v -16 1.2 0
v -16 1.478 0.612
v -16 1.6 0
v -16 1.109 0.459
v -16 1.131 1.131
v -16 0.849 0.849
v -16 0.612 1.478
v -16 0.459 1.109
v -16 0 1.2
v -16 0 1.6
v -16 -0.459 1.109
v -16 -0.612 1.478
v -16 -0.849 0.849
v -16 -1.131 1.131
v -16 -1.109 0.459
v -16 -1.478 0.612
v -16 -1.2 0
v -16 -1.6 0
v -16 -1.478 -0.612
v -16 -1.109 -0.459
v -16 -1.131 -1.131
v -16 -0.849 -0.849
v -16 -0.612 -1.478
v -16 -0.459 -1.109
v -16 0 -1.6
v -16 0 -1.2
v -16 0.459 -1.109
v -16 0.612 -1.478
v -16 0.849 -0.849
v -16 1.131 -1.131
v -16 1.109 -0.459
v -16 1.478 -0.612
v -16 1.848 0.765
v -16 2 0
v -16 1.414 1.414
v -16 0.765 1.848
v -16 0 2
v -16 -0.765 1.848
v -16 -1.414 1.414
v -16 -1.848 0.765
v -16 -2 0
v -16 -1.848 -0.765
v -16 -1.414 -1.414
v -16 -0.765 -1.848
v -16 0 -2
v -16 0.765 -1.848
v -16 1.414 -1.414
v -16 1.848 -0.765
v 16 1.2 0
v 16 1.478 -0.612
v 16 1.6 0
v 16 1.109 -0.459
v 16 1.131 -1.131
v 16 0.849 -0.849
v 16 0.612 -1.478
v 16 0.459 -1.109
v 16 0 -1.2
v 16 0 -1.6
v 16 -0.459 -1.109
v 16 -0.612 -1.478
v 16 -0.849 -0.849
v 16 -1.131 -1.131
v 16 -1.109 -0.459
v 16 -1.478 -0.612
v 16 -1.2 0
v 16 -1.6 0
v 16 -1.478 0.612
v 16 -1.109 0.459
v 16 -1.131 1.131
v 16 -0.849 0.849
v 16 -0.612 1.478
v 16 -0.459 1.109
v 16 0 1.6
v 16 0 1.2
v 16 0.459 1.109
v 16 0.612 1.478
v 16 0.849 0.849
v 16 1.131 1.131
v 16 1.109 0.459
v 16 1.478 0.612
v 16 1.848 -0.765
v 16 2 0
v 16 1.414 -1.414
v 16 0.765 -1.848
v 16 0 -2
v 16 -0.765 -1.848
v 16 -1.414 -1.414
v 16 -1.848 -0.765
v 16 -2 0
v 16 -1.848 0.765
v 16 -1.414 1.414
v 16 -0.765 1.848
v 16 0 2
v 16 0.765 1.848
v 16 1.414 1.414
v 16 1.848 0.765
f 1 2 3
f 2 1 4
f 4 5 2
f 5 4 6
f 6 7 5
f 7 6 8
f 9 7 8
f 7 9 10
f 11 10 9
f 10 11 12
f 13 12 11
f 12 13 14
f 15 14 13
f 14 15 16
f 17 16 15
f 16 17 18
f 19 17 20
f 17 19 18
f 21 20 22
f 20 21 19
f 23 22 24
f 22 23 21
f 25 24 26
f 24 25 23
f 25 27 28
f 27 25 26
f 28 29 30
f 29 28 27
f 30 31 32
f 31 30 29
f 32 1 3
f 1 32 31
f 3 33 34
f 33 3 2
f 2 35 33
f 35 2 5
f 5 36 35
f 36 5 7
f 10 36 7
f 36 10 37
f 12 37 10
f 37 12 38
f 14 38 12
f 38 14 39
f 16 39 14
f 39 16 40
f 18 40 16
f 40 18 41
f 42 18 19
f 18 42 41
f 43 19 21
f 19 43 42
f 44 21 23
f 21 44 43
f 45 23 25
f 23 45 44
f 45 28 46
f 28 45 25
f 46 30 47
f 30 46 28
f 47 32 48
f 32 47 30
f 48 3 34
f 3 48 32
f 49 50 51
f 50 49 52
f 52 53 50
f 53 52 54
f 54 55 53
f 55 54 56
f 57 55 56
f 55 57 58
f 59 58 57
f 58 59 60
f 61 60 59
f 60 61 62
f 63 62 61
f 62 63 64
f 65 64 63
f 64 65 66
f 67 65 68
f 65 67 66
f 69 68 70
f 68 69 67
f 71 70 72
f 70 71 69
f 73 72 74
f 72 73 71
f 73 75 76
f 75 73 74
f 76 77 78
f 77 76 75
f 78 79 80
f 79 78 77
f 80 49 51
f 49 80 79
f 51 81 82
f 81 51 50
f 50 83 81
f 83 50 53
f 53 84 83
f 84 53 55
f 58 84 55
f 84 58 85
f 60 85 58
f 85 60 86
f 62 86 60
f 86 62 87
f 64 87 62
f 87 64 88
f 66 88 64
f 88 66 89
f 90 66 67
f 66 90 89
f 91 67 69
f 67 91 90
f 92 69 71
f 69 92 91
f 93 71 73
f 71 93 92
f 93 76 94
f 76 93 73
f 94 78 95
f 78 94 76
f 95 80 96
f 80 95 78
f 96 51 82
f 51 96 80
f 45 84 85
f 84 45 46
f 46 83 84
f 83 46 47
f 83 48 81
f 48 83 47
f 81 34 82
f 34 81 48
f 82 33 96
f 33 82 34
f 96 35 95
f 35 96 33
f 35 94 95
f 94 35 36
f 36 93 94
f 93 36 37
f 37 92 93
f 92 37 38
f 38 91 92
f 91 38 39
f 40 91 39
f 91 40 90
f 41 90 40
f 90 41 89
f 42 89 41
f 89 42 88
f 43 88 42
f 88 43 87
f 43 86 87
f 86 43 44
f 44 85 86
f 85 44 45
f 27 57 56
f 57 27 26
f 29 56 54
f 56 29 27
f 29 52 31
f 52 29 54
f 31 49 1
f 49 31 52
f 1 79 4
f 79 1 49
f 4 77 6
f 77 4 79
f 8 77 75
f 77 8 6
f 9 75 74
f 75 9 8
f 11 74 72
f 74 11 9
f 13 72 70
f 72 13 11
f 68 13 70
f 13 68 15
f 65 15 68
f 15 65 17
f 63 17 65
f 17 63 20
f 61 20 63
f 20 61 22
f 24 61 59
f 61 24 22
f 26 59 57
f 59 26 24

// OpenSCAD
// file: ../p/4-4cyli.scad
use <../lib.scad>
function ldraw_lib__4_4cyli() = [
// 0 Cylinder 1.0
// 0 Name: 4-4cyli.dat
// 0 Author: James Jessiman
// 0 !LDRAW_ORG Primitive UPDATE 2005-01
// 0 !LICENSE Licensed under CC BY 4.0 : see CAreadme.txt
// 
// 0 BFC CERTIFY CCW
  [0,"BFC","CERTIFY"],
  [0,"BFC","CCW"],
// 
// 0 !HISTORY 1998-12-15 [PTadmin] Official Update 1998-10
// 0 !HISTORY 2002-03-23 [sbliss] Added BFC statement; merged headers from files in distributions LDraw 0.27 and Complete.
// 0 !HISTORY 2002-04-25 [PTadmin] Official Update 2002-02
// 0 !HISTORY 2004-12-14 [guyvivan] BFC CCW
// 0 !HISTORY 2005-12-28 [PTadmin] Official Update 2005-01
// 0 !HISTORY 2007-06-24 [PTadmin] Header formatted for Contributor Agreement
// 0 !HISTORY 2008-07-01 [PTadmin] Official Update 2008-01
// 
// 
// 4 16 1 1 0 0.9239 1 0.3827 0.9239 0 0.3827 1 0 0
  [4,16,1,1,0,0.9239,1,0.3827,0.9239,0,0.3827,1,0,0],
// 5 24 1 0 0 1 1 0 0.9239 0 0.3827 0.9239 0 -0.3827
  [5,24,1,0,0,1,1,0,0.9239,0,0.3827,0.9239,0,-0.3827],
// 4 16 0.9239 1 0.3827 0.7071 1 0.7071 0.7071 0 0.7071 0.9239 0 0.3827
  [4,16,0.9239,1,0.3827,0.7071,1,0.7071,0.7071,0,0.7071,0.9239,0,0.3827],
// 5 24 0.9239 0 0.3827 0.9239 1 0.3827 0.7071 0 0.7071 1 0 0
  [5,24,0.9239,0,0.3827,0.9239,1,0.3827,0.7071,0,0.7071,1,0,0],
// 4 16 0.7071 1 0.7071 0.3827 1 0.9239 0.3827 0 0.9239 0.7071 0 0.7071
  [4,16,0.7071,1,0.7071,0.3827,1,0.9239,0.3827,0,0.9239,0.7071,0,0.7071],
// 5 24 0.7071 0 0.7071 0.7071 1 0.7071 0.3827 0 0.9239 0.9239 0 0.3827
  [5,24,0.7071,0,0.7071,0.7071,1,0.7071,0.3827,0,0.9239,0.9239,0,0.3827],
// 4 16 0.3827 1 0.9239 0 1 1 0 0 1 0.3827 0 0.9239
  [4,16,0.3827,1,0.9239,0,1,1,0,0,1,0.3827,0,0.9239],
// 5 24 0.3827 0 0.9239 0.3827 1 0.9239 0 0 1 0.7071 0 0.7071
  [5,24,0.3827,0,0.9239,0.3827,1,0.9239,0,0,1,0.7071,0,0.7071],
// 4 16 0 1 1 -0.3827 1 0.9239 -0.3827 0 0.9239 0 0 1
  [4,16,0,1,1,-0.3827,1,0.9239,-0.3827,0,0.9239,0,0,1],
// 5 24 0 0 1 0 1 1 -0.3827 0 0.9239 0.3827 0 0.9239
  [5,24,0,0,1,0,1,1,-0.3827,0,0.9239,0.3827,0,0.9239],
// 4 16 -0.3827 1 0.9239 -0.7071 1 0.7071 -0.7071 0 0.7071 -0.3827 0 0.9239
  [4,16,-0.3827,1,0.9239,-0.7071,1,0.7071,-0.7071,0,0.7071,-0.3827,0,0.9239],
// 5 24 -0.3827 0 0.9239 -0.3827 1 0.9239 -0.7071 0 0.7071 0 0 1
  [5,24,-0.3827,0,0.9239,-0.3827,1,0.9239,-0.7071,0,0.7071,0,0,1],
// 4 16 -0.7071 1 0.7071 -0.9239 1 0.3827 -0.9239 0 0.3827 -0.7071 0 0.7071
  [4,16,-0.7071,1,0.7071,-0.9239,1,0.3827,-0.9239,0,0.3827,-0.7071,0,0.7071],
// 5 24 -0.7071 0 0.7071 -0.7071 1 0.7071 -0.9239 0 0.3827 -0.3827 0 0.9239
  [5,24,-0.7071,0,0.7071,-0.7071,1,0.7071,-0.9239,0,0.3827,-0.3827,0,0.9239],
// 4 16 -0.9239 1 0.3827 -1 1 0 -1 0 0 -0.9239 0 0.3827
  [4,16,-0.9239,1,0.3827,-1,1,0,-1,0,0,-0.9239,0,0.3827],
// 5 24 -0.9239 0 0.3827 -0.9239 1 0.3827 -1 0 0 -0.7071 0 0.7071
  [5,24,-0.9239,0,0.3827,-0.9239,1,0.3827,-1,0,0,-0.7071,0,0.7071],
// 4 16 -1 1 0 -0.9239 1 -0.3827 -0.9239 0 -0.3827 -1 0 0
  [4,16,-1,1,0,-0.9239,1,-0.3827,-0.9239,0,-0.3827,-1,0,0],
// 5 24 -1 0 0 -1 1 0 -0.9239 0 -0.3827 -0.9239 0 0.3827
  [5,24,-1,0,0,-1,1,0,-0.9239,0,-0.3827,-0.9239,0,0.3827],
// 4 16 -0.9239 1 -0.3827 -0.7071 1 -0.7071 -0.7071 0 -0.7071 -0.9239 0 -0.3827
  [4,16,-0.9239,1,-0.3827,-0.7071,1,-0.7071,-0.7071,0,-0.7071,-0.9239,0,-0.3827],
// 5 24 -0.9239 0 -0.3827 -0.9239 1 -0.3827 -0.7071 0 -0.7071 -1 0 0
  [5,24,-0.9239,0,-0.3827,-0.9239,1,-0.3827,-0.7071,0,-0.7071,-1,0,0],
// 4 16 -0.7071 1 -0.7071 -0.3827 1 -0.9239 -0.3827 0 -0.9239 -0.7071 0 -0.7071
  [4,16,-0.7071,1,-0.7071,-0.3827,1,-0.9239,-0.3827,0,-0.9239,-0.7071,0,-0.7071],
// 5 24 -0.7071 0 -0.7071 -0.7071 1 -0.7071 -0.3827 0 -0.9239 -0.9239 0 -0.3827
  [5,24,-0.7071,0,-0.7071,-0.7071,1,-0.7071,-0.3827,0,-0.9239,-0.9239,0,-0.3827],
// 4 16 -0.3827 1 -0.9239 0 1 -1 0 0 -1 -0.3827 0 -0.9239
  [4,16,-0.3827,1,-0.9239,0,1,-1,0,0,-1,-0.3827,0,-0.9239],
// 5 24 -0.3827 0 -0.9239 -0.3827 1 -0.9239 0 0 -1 -0.7071 0 -0.7071
  [5,24,-0.3827,0,-0.9239,-0.3827,1,-0.9239,0,0,-1,-0.7071,0,-0.7071],
// 4 16 0 1 -1 0.3827 1 -0.9239 0.3827 0 -0.9239 0 0 -1
  [4,16,0,1,-1,0.3827,1,-0.9239,0.3827,0,-0.9239,0,0,-1],
// 5 24 0 0 -1 0 1 -1 0.3827 0 -0.9239 -0.3827 0 -0.9239
  [5,24,0,0,-1,0,1,-1,0.3827,0,-0.9239,-0.3827,0,-0.9239],
// 4 16 0.3827 1 -0.9239 0.7071 1 -0.7071 0.7071 0 -0.7071 0.3827 0 -0.9239
  [4,16,0.3827,1,-0.9239,0.7071,1,-0.7071,0.7071,0,-0.7071,0.3827,0,-0.9239],
// 5 24 0.3827 0 -0.9239 0.3827 1 -0.9239 0.7071 0 -0.7071 0 0 -1
  [5,24,0.3827,0,-0.9239,0.3827,1,-0.9239,0.7071,0,-0.7071,0,0,-1],
// 4 16 0.7071 1 -0.7071 0.9239 1 -0.3827 0.9239 0 -0.3827 0.7071 0 -0.7071
  [4,16,0.7071,1,-0.7071,0.9239,1,-0.3827,0.9239,0,-0.3827,0.7071,0,-0.7071],
// 5 24 0.7071 0 -0.7071 0.7071 1 -0.7071 0.9239 0 -0.3827 0.3827 0 -0.9239
  [5,24,0.7071,0,-0.7071,0.7071,1,-0.7071,0.9239,0,-0.3827,0.3827,0,-0.9239],
// 4 16 0.9239 1 -0.3827 1 1 0 1 0 0 0.9239 0 -0.3827
  [4,16,0.9239,1,-0.3827,1,1,0,1,0,0,0.9239,0,-0.3827],
// 5 24 0.9239 0 -0.3827 0.9239 1 -0.3827 1 0 0 0.7071 0 -0.7071
  [5,24,0.9239,0,-0.3827,0.9239,1,-0.3827,1,0,0,0.7071,0,-0.7071],
// 0
];
module ldraw_lib__4_4cyli(step=0, col=false, unit=2/5, alt=false, line=0.2, solid=!$preview)
    makepoly(ldraw_lib__4_4cyli(), step=step, col=col, unit=unit, alt=alt, line=line, solid=solid);
ldraw_lib__4_4cyli(line=0.2);
// file: ../p/4-4ring4.scad
use <../lib.scad>
function ldraw_lib__4_4ring4() = [
// 0 Ring  4 x 1.0
// 0 Name: 4-4ring4.dat
// 0 Author: James Jessiman
// 0 !LDRAW_ORG Primitive UPDATE 2009-01
// 0 !LICENSE Licensed under CC BY 4.0 : see CAreadme.txt
// 
// 0 BFC CERTIFY CCW
  [0,"BFC","CERTIFY"],
  [0,"BFC","CCW"],
// 
// 0 !HISTORY 1998-12-15 [PTadmin] Official Update 1998-10
// 0 !HISTORY 2002-04-08 [BrickCaster] Modified for BFC compliance
// 0 !HISTORY 2002-04-25 [PTadmin] Official Update 2002-02
// 0 !HISTORY 2007-06-24 [PTadmin] Header formatted for Contributor Agreement
// 0 !HISTORY 2008-07-01 [PTadmin] Official Update 2008-01
// 0 !HISTORY 2008-08-26 [cwdee] Switch polygon winding and rename
// 0 !HISTORY 2009-05-02 [PTadmin] Official Update 2009-01
// 
// 
// 4 16 -1.9135 0 4.6195 -1.5308 0 3.6956 0 0 4 0 0 5
  [4,16,-1.9135,0,4.6195,-1.5308,0,3.6956,0,0,4,0,0,5],
// 4 16 -3.5355 0 3.5355 -2.8284 0 2.8284 -1.5308 0 3.6956 -1.9135 0 4.6195
  [4,16,-3.5355,0,3.5355,-2.8284,0,2.8284,-1.5308,0,3.6956,-1.9135,0,4.6195],
// 4 16 -4.6195 0 1.9135 -3.6956 0 1.5308 -2.8284 0 2.8284 -3.5355 0 3.5355
  [4,16,-4.6195,0,1.9135,-3.6956,0,1.5308,-2.8284,0,2.8284,-3.5355,0,3.5355],
// 4 16 -5 0 0 -4 0 0 -3.6956 0 1.5308 -4.6195 0 1.9135
  [4,16,-5,0,0,-4,0,0,-3.6956,0,1.5308,-4.6195,0,1.9135],
// 4 16 -4.6195 0 -1.9135 -3.6956 0 -1.5308 -4 0 0 -5 0 0
  [4,16,-4.6195,0,-1.9135,-3.6956,0,-1.5308,-4,0,0,-5,0,0],
// 4 16 -3.5355 0 -3.5355 -2.8284 0 -2.8284 -3.6956 0 -1.5308 -4.6195 0 -1.9135
  [4,16,-3.5355,0,-3.5355,-2.8284,0,-2.8284,-3.6956,0,-1.5308,-4.6195,0,-1.9135],
// 4 16 -1.9135 0 -4.6195 -1.5308 0 -3.6956 -2.8284 0 -2.8284 -3.5355 0 -3.5355
  [4,16,-1.9135,0,-4.6195,-1.5308,0,-3.6956,-2.8284,0,-2.8284,-3.5355,0,-3.5355],
// 4 16 0 0 -5 0 0 -4 -1.5308 0 -3.6956 -1.9135 0 -4.6195
  [4,16,0,0,-5,0,0,-4,-1.5308,0,-3.6956,-1.9135,0,-4.6195],
// 4 16 1.9135 0 -4.6195 1.5308 0 -3.6956 0 0 -4 0 0 -5
  [4,16,1.9135,0,-4.6195,1.5308,0,-3.6956,0,0,-4,0,0,-5],
// 4 16 3.5355 0 -3.5355 2.8284 0 -2.8284 1.5308 0 -3.6956 1.9135 0 -4.6195
  [4,16,3.5355,0,-3.5355,2.8284,0,-2.8284,1.5308,0,-3.6956,1.9135,0,-4.6195],
// 4 16 4.6195 0 -1.9135 3.6956 0 -1.5308 2.8284 0 -2.8284 3.5355 0 -3.5355
  [4,16,4.6195,0,-1.9135,3.6956,0,-1.5308,2.8284,0,-2.8284,3.5355,0,-3.5355],
// 4 16 5 0 0 4 0 0 3.6956 0 -1.5308 4.6195 0 -1.9135
  [4,16,5,0,0,4,0,0,3.6956,0,-1.5308,4.6195,0,-1.9135],
// 4 16 4.6195 0 1.9135 3.6956 0 1.5308 4 0 0 5 0 0
  [4,16,4.6195,0,1.9135,3.6956,0,1.5308,4,0,0,5,0,0],
// 4 16 3.5355 0 3.5355 2.8284 0 2.8284 3.6956 0 1.5308 4.6195 0 1.9135
  [4,16,3.5355,0,3.5355,2.8284,0,2.8284,3.6956,0,1.5308,4.6195,0,1.9135],
// 4 16 1.9135 0 4.6195 1.5308 0 3.6956 2.8284 0 2.8284 3.5355 0 3.5355
  [4,16,1.9135,0,4.6195,1.5308,0,3.6956,2.8284,0,2.8284,3.5355,0,3.5355],
// 4 16 0 0 5 0 0 4 1.5308 0 3.6956 1.9135 0 4.6195
  [4,16,0,0,5,0,0,4,1.5308,0,3.6956,1.9135,0,4.6195],
// 0
];
module ldraw_lib__4_4ring4(step=0, col=false, unit=2/5, alt=false, line=0.2, solid=!$preview)
    makepoly(ldraw_lib__4_4ring4(), step=step, col=col, unit=unit, alt=alt, line=line, solid=solid);
ldraw_lib__4_4ring4(line=0.2);
// file: ../p/4-4ring3.scad
use <../lib.scad>
function ldraw_lib__4_4ring3() = [
// 0 Ring  3 x 1.0
// 0 Name: 4-4ring3.dat
// 0 Author: James Jessiman
// 0 !LDRAW_ORG Primitive UPDATE 2009-01
// 0 !LICENSE Licensed under CC BY 4.0 : see CAreadme.txt
// 
// 0 BFC CERTIFY CCW
  [0,"BFC","CERTIFY"],
  [0,"BFC","CCW"],
// 
// 0 !HISTORY 1998-12-15 [PTadmin] Official Update 1998-10
// 0 !HISTORY 2002-04-05 [hafhead] Added BFC statement
// 0 !HISTORY 2002-04-25 [PTadmin] Official Update 2002-02
// 0 !HISTORY 2007-06-24 [PTadmin] Header formatted for Contributor Agreement
// 0 !HISTORY 2008-07-01 [PTadmin] Official Update 2008-01
// 0 !HISTORY 2008-08-26 [cwdee] Switch polygon winding and rename
// 0 !HISTORY 2009-05-02 [PTadmin] Official Update 2009-01
// 
// 
// 4 16 -1.5308 0 3.6956 -1.1481 0 2.7717 0 0 3 0 0 4
  [4,16,-1.5308,0,3.6956,-1.1481,0,2.7717,0,0,3,0,0,4],
// 4 16 -2.8284 0 2.8284 -2.1213 0 2.1213 -1.1481 0 2.7717 -1.5308 0 3.6956
  [4,16,-2.8284,0,2.8284,-2.1213,0,2.1213,-1.1481,0,2.7717,-1.5308,0,3.6956],
// 4 16 -3.6956 0 1.5308 -2.7717 0 1.1481 -2.1213 0 2.1213 -2.8284 0 2.8284
  [4,16,-3.6956,0,1.5308,-2.7717,0,1.1481,-2.1213,0,2.1213,-2.8284,0,2.8284],
// 4 16 -4 0 0 -3 0 0 -2.7717 0 1.1481 -3.6956 0 1.5308
  [4,16,-4,0,0,-3,0,0,-2.7717,0,1.1481,-3.6956,0,1.5308],
// 4 16 -3.6956 0 -1.5308 -2.7717 0 -1.1481 -3 0 0 -4 0 0
  [4,16,-3.6956,0,-1.5308,-2.7717,0,-1.1481,-3,0,0,-4,0,0],
// 4 16 -2.8284 0 -2.8284 -2.1213 0 -2.1213 -2.7717 0 -1.1481 -3.6956 0 -1.5308
  [4,16,-2.8284,0,-2.8284,-2.1213,0,-2.1213,-2.7717,0,-1.1481,-3.6956,0,-1.5308],
// 4 16 -1.5308 0 -3.6956 -1.1481 0 -2.7717 -2.1213 0 -2.1213 -2.8284 0 -2.8284
  [4,16,-1.5308,0,-3.6956,-1.1481,0,-2.7717,-2.1213,0,-2.1213,-2.8284,0,-2.8284],
// 4 16 0 0 -4 0 0 -3 -1.1481 0 -2.7717 -1.5308 0 -3.6956
  [4,16,0,0,-4,0,0,-3,-1.1481,0,-2.7717,-1.5308,0,-3.6956],
// 4 16 1.5308 0 -3.6956 1.1481 0 -2.7717 0 0 -3 0 0 -4
  [4,16,1.5308,0,-3.6956,1.1481,0,-2.7717,0,0,-3,0,0,-4],
// 4 16 2.8284 0 -2.8284 2.1213 0 -2.1213 1.1481 0 -2.7717 1.5308 0 -3.6956
  [4,16,2.8284,0,-2.8284,2.1213,0,-2.1213,1.1481,0,-2.7717,1.5308,0,-3.6956],
// 4 16 3.6956 0 -1.5308 2.7717 0 -1.1481 2.1213 0 -2.1213 2.8284 0 -2.8284
  [4,16,3.6956,0,-1.5308,2.7717,0,-1.1481,2.1213,0,-2.1213,2.8284,0,-2.8284],
// 4 16 4 0 0 3 0 0 2.7717 0 -1.1481 3.6956 0 -1.5308
  [4,16,4,0,0,3,0,0,2.7717,0,-1.1481,3.6956,0,-1.5308],
// 4 16 3.6956 0 1.5308 2.7717 0 1.1481 3 0 0 4 0 0
  [4,16,3.6956,0,1.5308,2.7717,0,1.1481,3,0,0,4,0,0],
// 4 16 2.8284 0 2.8284 2.1213 0 2.1213 2.7717 0 1.1481 3.6956 0 1.5308
  [4,16,2.8284,0,2.8284,2.1213,0,2.1213,2.7717,0,1.1481,3.6956,0,1.5308],
// 4 16 1.5308 0 3.6956 1.1481 0 2.7717 2.1213 0 2.1213 2.8284 0 2.8284
  [4,16,1.5308,0,3.6956,1.1481,0,2.7717,2.1213,0,2.1213,2.8284,0,2.8284],
// 4 16 0 0 4 0 0 3 1.1481 0 2.7717 1.5308 0 3.6956
  [4,16,0,0,4,0,0,3,1.1481,0,2.7717,1.5308,0,3.6956],
// 0
];
module ldraw_lib__4_4ring3(step=0, col=false, unit=2/5, alt=false, line=0.2, solid=!$preview)
    makepoly(ldraw_lib__4_4ring3(), step=step, col=col, unit=unit, alt=alt, line=line, solid=solid);
ldraw_lib__4_4ring3(line=0.2);
// file: ../p/4-4edge.scad
use <../lib.scad>
function ldraw_lib__4_4edge() = [
// 0 Circle 1.0
// 0 Name: 4-4edge.dat
// 0 Author: James Jessiman
// 0 !LDRAW_ORG Primitive UPDATE 2017-01
// 0 !LICENSE Licensed under CC BY 4.0 : see CAreadme.txt
// 
// 0 BFC CERTIFY CCW
  [0,"BFC","CERTIFY"],
  [0,"BFC","CCW"],
// 
// 0 !HISTORY 1998-12-15 [PTadmin] Official Update 1998-10
// 0 !HISTORY 2005-12-28 [PTadmin] Official Update 2005-01
// 0 !HISTORY 2007-06-24 [PTadmin] Header formatted for Contributor Agreement
// 0 !HISTORY 2008-07-01 [PTadmin] Official Update 2008-01
// 0 !HISTORY 2017-01-15 [Steffen] BFCed
// 0 !HISTORY 2017-12-30 [PTadmin] Official Update 2017-01
// 
// 
// 2 24 1 0 0 0.9239 0 0.3827
  [2,24,1,0,0,0.9239,0,0.3827],
// 2 24 0.9239 0 0.3827 0.7071 0 0.7071
  [2,24,0.9239,0,0.3827,0.7071,0,0.7071],
// 2 24 0.7071 0 0.7071 0.3827 0 0.9239
  [2,24,0.7071,0,0.7071,0.3827,0,0.9239],
// 2 24 0.3827 0 0.9239 0 0 1
  [2,24,0.3827,0,0.9239,0,0,1],
// 2 24 0 0 1 -0.3827 0 0.9239
  [2,24,0,0,1,-0.3827,0,0.9239],
// 2 24 -0.3827 0 0.9239 -0.7071 0 0.7071
  [2,24,-0.3827,0,0.9239,-0.7071,0,0.7071],
// 2 24 -0.7071 0 0.7071 -0.9239 0 0.3827
  [2,24,-0.7071,0,0.7071,-0.9239,0,0.3827],
// 2 24 -0.9239 0 0.3827 -1 0 -0
  [2,24,-0.9239,0,0.3827,-1,0,-0],
// 2 24 -1 0 -0 -0.9239 0 -0.3827
  [2,24,-1,0,-0,-0.9239,0,-0.3827],
// 2 24 -0.9239 0 -0.3827 -0.7071 0 -0.7071
  [2,24,-0.9239,0,-0.3827,-0.7071,0,-0.7071],
// 2 24 -0.7071 0 -0.7071 -0.3827 0 -0.9239
  [2,24,-0.7071,0,-0.7071,-0.3827,0,-0.9239],
// 2 24 -0.3827 0 -0.9239 0 0 -1
  [2,24,-0.3827,0,-0.9239,0,0,-1],
// 2 24 0 0 -1 0.3827 0 -0.9239
  [2,24,0,0,-1,0.3827,0,-0.9239],
// 2 24 0.3827 0 -0.9239 0.7071 0 -0.7071
  [2,24,0.3827,0,-0.9239,0.7071,0,-0.7071],
// 2 24 0.7071 0 -0.7071 0.9239 0 -0.3827
  [2,24,0.7071,0,-0.7071,0.9239,0,-0.3827],
// 2 24 0.9239 0 -0.3827 1 0 0
  [2,24,0.9239,0,-0.3827,1,0,0],
];
module ldraw_lib__4_4edge(step=0, col=false, unit=2/5, alt=false, line=0.2, solid=!$preview)
    makepoly(ldraw_lib__4_4edge(), step=step, col=col, unit=unit, alt=alt, line=line, solid=solid);
ldraw_lib__4_4edge(line=0.2);
// file: 71533k03.scad
use <../lib.scad>
use <../p/4-4cyli.scad>
function ldraw_lib__71533k03() = [
// 0 ~Technic Pneumatic Tube Segment
// 0 Name: 71533k03.dat
// 0 Author: Jaco van der Molen [Jaco]
// 0 !LDRAW_ORG Part Flexible_Section UPDATE 2020-01
// 0 !LICENSE Licensed under CC BY 4.0 : see CAreadme.txt
// 
// 0 BFC CERTIFY CW
  [0,"BFC","CERTIFY"],
  [0,"BFC","CW"],
// 
// 0 !HISTORY 2003-11-30 [Steffen] BFCed
// 0 !HISTORY 2009-12-29 [PTadmin] Official Update 2009-03
// 0 !HISTORY 2020-06-27 [PTadmin] Renamed from 166
// 0 !HISTORY 2020-06-28 [PTadmin] Official Update 2020-01
// 
// 
// 1 16 0 0 0 5 0 0 0 1 0 0 0 5 4-4cyli.dat
  [1,16,0,0,0,5,0,0,0,1,0,0,0,5, ldraw_lib__4_4cyli()],
// 0 BFC INVERTNEXT
  [0,"BFC","INVERTNEXT"],
// 1 16 0 0 0 3 0 0 0 1 0 0 0 3 4-4cyli.dat
  [1,16,0,0,0,3,0,0,0,1,0,0,0,3, ldraw_lib__4_4cyli()],
// 0
];
module ldraw_lib__71533k03(step=0, col=false, unit=2/5, alt=false, line=0.2, solid=!$preview)
    makepoly(ldraw_lib__71533k03(), step=step, col=col, unit=unit, alt=alt, line=line, solid=solid);
ldraw_lib__71533k03(line=0.2);
// file: 71533k02.scad
use <../lib.scad>
use <../p/4-4edge.scad>
use <../p/4-4ring3.scad>
use <../p/4-4ring4.scad>
function ldraw_lib__71533k02() = [
// 0 ~Technic Pneumatic Tube End (Non-Bulged)
// 0 Name: 71533k02.dat
// 0 Author: Steffen [Steffen]
// 0 !LDRAW_ORG Part Flexible_Section UPDATE 2020-01
// 0 !LICENSE Licensed under CC BY 4.0 : see CAreadme.txt
// 
// 0 BFC CERTIFY CCW
  [0,"BFC","CERTIFY"],
  [0,"BFC","CCW"],
// 
// 0 !HISTORY 2020-06-28 [PTadmin] Official Update 2020-01
// 
// 
// 0 // This file goes together with 71533k01.dat and 71533k03.dat.
// 0 // Those 3 files can be used to create Technic Pneumatic Tubes
// 0 // with either bulged or non-bulged ends.
// 
// 1 16 0 0 0 1 0 0 0 1 0 0 0 1 4-4ring3.dat
  [1,16,0,0,0,1,0,0,0,1,0,0,0,1, ldraw_lib__4_4ring3()],
// 1 16 0 0 0 1 0 0 0 1 0 0 0 1 4-4ring4.dat
  [1,16,0,0,0,1,0,0,0,1,0,0,0,1, ldraw_lib__4_4ring4()],
// 1 16 0 0 0 3 0 0 0 3 0 0 0 3 4-4edge.dat
  [1,16,0,0,0,3,0,0,0,3,0,0,0,3, ldraw_lib__4_4edge()],
// 1 16 0 0 0 5 0 0 0 5 0 0 0 5 4-4edge.dat
  [1,16,0,0,0,5,0,0,0,5,0,0,0,5, ldraw_lib__4_4edge()],
];
module ldraw_lib__71533k02(step=0, col=false, unit=2/5, alt=false, line=0.2, solid=!$preview)
    makepoly(ldraw_lib__71533k02(), step=step, col=col, unit=unit, alt=alt, line=line, solid=solid);
ldraw_lib__71533k02(line=0.2);
// main file
use <../lib.scad>
use <71533k02.scad>
use <71533k03.scad>
function ldraw_lib__26445_f1() = [
// 0 Technic Pneumatic Tube  4L
// 0 Name: 26445-f1.dat
// 0 Author: Philippe Hurbain [Philo]
// 0 !LDRAW_ORG Part UPDATE 2020-01
// 0 !LICENSE Licensed under CC BY 4.0 : see CAreadme.txt
// 
// 0 BFC CERTIFY CCW
  [0,"BFC","CERTIFY"],
  [0,"BFC","CCW"],
// 
// 0 !KEYWORDS 32 mm, BrickLink 26445, Rebrickable 5102c04
// 
// 0 !HISTORY 2020-06-28 [PTadmin] Official Update 2020-01
// 
// 
// 1 16 -40 0 0 0 1 0 1 0 0 0 0 1 71533k02.dat
  [1,16,-40,0,0,0,1,0,1,0,0,0,0,1, ldraw_lib__71533k02()],
// 1 16 40 0 0 0 -1 0 -1 0 0 0 0 1 71533k02.dat
  [1,16,40,0,0,0,-1,0,-1,0,0,0,0,1, ldraw_lib__71533k02()],
// 1 16 -40 0 0 0 80 0 1 0 0 0 0 1 71533k03.dat
  [1,16,-40,0,0,0,80,0,1,0,0,0,0,1, ldraw_lib__71533k03()],
];
module ldraw_lib__26445_f1(step=0, col=false, unit=2/5, alt=false, line=0.2, solid=!$preview)
    makepoly(ldraw_lib__26445_f1(), step=step, col=col, unit=unit, alt=alt, line=line, solid=solid);
ldraw_lib__26445_f1(line=0.2);
